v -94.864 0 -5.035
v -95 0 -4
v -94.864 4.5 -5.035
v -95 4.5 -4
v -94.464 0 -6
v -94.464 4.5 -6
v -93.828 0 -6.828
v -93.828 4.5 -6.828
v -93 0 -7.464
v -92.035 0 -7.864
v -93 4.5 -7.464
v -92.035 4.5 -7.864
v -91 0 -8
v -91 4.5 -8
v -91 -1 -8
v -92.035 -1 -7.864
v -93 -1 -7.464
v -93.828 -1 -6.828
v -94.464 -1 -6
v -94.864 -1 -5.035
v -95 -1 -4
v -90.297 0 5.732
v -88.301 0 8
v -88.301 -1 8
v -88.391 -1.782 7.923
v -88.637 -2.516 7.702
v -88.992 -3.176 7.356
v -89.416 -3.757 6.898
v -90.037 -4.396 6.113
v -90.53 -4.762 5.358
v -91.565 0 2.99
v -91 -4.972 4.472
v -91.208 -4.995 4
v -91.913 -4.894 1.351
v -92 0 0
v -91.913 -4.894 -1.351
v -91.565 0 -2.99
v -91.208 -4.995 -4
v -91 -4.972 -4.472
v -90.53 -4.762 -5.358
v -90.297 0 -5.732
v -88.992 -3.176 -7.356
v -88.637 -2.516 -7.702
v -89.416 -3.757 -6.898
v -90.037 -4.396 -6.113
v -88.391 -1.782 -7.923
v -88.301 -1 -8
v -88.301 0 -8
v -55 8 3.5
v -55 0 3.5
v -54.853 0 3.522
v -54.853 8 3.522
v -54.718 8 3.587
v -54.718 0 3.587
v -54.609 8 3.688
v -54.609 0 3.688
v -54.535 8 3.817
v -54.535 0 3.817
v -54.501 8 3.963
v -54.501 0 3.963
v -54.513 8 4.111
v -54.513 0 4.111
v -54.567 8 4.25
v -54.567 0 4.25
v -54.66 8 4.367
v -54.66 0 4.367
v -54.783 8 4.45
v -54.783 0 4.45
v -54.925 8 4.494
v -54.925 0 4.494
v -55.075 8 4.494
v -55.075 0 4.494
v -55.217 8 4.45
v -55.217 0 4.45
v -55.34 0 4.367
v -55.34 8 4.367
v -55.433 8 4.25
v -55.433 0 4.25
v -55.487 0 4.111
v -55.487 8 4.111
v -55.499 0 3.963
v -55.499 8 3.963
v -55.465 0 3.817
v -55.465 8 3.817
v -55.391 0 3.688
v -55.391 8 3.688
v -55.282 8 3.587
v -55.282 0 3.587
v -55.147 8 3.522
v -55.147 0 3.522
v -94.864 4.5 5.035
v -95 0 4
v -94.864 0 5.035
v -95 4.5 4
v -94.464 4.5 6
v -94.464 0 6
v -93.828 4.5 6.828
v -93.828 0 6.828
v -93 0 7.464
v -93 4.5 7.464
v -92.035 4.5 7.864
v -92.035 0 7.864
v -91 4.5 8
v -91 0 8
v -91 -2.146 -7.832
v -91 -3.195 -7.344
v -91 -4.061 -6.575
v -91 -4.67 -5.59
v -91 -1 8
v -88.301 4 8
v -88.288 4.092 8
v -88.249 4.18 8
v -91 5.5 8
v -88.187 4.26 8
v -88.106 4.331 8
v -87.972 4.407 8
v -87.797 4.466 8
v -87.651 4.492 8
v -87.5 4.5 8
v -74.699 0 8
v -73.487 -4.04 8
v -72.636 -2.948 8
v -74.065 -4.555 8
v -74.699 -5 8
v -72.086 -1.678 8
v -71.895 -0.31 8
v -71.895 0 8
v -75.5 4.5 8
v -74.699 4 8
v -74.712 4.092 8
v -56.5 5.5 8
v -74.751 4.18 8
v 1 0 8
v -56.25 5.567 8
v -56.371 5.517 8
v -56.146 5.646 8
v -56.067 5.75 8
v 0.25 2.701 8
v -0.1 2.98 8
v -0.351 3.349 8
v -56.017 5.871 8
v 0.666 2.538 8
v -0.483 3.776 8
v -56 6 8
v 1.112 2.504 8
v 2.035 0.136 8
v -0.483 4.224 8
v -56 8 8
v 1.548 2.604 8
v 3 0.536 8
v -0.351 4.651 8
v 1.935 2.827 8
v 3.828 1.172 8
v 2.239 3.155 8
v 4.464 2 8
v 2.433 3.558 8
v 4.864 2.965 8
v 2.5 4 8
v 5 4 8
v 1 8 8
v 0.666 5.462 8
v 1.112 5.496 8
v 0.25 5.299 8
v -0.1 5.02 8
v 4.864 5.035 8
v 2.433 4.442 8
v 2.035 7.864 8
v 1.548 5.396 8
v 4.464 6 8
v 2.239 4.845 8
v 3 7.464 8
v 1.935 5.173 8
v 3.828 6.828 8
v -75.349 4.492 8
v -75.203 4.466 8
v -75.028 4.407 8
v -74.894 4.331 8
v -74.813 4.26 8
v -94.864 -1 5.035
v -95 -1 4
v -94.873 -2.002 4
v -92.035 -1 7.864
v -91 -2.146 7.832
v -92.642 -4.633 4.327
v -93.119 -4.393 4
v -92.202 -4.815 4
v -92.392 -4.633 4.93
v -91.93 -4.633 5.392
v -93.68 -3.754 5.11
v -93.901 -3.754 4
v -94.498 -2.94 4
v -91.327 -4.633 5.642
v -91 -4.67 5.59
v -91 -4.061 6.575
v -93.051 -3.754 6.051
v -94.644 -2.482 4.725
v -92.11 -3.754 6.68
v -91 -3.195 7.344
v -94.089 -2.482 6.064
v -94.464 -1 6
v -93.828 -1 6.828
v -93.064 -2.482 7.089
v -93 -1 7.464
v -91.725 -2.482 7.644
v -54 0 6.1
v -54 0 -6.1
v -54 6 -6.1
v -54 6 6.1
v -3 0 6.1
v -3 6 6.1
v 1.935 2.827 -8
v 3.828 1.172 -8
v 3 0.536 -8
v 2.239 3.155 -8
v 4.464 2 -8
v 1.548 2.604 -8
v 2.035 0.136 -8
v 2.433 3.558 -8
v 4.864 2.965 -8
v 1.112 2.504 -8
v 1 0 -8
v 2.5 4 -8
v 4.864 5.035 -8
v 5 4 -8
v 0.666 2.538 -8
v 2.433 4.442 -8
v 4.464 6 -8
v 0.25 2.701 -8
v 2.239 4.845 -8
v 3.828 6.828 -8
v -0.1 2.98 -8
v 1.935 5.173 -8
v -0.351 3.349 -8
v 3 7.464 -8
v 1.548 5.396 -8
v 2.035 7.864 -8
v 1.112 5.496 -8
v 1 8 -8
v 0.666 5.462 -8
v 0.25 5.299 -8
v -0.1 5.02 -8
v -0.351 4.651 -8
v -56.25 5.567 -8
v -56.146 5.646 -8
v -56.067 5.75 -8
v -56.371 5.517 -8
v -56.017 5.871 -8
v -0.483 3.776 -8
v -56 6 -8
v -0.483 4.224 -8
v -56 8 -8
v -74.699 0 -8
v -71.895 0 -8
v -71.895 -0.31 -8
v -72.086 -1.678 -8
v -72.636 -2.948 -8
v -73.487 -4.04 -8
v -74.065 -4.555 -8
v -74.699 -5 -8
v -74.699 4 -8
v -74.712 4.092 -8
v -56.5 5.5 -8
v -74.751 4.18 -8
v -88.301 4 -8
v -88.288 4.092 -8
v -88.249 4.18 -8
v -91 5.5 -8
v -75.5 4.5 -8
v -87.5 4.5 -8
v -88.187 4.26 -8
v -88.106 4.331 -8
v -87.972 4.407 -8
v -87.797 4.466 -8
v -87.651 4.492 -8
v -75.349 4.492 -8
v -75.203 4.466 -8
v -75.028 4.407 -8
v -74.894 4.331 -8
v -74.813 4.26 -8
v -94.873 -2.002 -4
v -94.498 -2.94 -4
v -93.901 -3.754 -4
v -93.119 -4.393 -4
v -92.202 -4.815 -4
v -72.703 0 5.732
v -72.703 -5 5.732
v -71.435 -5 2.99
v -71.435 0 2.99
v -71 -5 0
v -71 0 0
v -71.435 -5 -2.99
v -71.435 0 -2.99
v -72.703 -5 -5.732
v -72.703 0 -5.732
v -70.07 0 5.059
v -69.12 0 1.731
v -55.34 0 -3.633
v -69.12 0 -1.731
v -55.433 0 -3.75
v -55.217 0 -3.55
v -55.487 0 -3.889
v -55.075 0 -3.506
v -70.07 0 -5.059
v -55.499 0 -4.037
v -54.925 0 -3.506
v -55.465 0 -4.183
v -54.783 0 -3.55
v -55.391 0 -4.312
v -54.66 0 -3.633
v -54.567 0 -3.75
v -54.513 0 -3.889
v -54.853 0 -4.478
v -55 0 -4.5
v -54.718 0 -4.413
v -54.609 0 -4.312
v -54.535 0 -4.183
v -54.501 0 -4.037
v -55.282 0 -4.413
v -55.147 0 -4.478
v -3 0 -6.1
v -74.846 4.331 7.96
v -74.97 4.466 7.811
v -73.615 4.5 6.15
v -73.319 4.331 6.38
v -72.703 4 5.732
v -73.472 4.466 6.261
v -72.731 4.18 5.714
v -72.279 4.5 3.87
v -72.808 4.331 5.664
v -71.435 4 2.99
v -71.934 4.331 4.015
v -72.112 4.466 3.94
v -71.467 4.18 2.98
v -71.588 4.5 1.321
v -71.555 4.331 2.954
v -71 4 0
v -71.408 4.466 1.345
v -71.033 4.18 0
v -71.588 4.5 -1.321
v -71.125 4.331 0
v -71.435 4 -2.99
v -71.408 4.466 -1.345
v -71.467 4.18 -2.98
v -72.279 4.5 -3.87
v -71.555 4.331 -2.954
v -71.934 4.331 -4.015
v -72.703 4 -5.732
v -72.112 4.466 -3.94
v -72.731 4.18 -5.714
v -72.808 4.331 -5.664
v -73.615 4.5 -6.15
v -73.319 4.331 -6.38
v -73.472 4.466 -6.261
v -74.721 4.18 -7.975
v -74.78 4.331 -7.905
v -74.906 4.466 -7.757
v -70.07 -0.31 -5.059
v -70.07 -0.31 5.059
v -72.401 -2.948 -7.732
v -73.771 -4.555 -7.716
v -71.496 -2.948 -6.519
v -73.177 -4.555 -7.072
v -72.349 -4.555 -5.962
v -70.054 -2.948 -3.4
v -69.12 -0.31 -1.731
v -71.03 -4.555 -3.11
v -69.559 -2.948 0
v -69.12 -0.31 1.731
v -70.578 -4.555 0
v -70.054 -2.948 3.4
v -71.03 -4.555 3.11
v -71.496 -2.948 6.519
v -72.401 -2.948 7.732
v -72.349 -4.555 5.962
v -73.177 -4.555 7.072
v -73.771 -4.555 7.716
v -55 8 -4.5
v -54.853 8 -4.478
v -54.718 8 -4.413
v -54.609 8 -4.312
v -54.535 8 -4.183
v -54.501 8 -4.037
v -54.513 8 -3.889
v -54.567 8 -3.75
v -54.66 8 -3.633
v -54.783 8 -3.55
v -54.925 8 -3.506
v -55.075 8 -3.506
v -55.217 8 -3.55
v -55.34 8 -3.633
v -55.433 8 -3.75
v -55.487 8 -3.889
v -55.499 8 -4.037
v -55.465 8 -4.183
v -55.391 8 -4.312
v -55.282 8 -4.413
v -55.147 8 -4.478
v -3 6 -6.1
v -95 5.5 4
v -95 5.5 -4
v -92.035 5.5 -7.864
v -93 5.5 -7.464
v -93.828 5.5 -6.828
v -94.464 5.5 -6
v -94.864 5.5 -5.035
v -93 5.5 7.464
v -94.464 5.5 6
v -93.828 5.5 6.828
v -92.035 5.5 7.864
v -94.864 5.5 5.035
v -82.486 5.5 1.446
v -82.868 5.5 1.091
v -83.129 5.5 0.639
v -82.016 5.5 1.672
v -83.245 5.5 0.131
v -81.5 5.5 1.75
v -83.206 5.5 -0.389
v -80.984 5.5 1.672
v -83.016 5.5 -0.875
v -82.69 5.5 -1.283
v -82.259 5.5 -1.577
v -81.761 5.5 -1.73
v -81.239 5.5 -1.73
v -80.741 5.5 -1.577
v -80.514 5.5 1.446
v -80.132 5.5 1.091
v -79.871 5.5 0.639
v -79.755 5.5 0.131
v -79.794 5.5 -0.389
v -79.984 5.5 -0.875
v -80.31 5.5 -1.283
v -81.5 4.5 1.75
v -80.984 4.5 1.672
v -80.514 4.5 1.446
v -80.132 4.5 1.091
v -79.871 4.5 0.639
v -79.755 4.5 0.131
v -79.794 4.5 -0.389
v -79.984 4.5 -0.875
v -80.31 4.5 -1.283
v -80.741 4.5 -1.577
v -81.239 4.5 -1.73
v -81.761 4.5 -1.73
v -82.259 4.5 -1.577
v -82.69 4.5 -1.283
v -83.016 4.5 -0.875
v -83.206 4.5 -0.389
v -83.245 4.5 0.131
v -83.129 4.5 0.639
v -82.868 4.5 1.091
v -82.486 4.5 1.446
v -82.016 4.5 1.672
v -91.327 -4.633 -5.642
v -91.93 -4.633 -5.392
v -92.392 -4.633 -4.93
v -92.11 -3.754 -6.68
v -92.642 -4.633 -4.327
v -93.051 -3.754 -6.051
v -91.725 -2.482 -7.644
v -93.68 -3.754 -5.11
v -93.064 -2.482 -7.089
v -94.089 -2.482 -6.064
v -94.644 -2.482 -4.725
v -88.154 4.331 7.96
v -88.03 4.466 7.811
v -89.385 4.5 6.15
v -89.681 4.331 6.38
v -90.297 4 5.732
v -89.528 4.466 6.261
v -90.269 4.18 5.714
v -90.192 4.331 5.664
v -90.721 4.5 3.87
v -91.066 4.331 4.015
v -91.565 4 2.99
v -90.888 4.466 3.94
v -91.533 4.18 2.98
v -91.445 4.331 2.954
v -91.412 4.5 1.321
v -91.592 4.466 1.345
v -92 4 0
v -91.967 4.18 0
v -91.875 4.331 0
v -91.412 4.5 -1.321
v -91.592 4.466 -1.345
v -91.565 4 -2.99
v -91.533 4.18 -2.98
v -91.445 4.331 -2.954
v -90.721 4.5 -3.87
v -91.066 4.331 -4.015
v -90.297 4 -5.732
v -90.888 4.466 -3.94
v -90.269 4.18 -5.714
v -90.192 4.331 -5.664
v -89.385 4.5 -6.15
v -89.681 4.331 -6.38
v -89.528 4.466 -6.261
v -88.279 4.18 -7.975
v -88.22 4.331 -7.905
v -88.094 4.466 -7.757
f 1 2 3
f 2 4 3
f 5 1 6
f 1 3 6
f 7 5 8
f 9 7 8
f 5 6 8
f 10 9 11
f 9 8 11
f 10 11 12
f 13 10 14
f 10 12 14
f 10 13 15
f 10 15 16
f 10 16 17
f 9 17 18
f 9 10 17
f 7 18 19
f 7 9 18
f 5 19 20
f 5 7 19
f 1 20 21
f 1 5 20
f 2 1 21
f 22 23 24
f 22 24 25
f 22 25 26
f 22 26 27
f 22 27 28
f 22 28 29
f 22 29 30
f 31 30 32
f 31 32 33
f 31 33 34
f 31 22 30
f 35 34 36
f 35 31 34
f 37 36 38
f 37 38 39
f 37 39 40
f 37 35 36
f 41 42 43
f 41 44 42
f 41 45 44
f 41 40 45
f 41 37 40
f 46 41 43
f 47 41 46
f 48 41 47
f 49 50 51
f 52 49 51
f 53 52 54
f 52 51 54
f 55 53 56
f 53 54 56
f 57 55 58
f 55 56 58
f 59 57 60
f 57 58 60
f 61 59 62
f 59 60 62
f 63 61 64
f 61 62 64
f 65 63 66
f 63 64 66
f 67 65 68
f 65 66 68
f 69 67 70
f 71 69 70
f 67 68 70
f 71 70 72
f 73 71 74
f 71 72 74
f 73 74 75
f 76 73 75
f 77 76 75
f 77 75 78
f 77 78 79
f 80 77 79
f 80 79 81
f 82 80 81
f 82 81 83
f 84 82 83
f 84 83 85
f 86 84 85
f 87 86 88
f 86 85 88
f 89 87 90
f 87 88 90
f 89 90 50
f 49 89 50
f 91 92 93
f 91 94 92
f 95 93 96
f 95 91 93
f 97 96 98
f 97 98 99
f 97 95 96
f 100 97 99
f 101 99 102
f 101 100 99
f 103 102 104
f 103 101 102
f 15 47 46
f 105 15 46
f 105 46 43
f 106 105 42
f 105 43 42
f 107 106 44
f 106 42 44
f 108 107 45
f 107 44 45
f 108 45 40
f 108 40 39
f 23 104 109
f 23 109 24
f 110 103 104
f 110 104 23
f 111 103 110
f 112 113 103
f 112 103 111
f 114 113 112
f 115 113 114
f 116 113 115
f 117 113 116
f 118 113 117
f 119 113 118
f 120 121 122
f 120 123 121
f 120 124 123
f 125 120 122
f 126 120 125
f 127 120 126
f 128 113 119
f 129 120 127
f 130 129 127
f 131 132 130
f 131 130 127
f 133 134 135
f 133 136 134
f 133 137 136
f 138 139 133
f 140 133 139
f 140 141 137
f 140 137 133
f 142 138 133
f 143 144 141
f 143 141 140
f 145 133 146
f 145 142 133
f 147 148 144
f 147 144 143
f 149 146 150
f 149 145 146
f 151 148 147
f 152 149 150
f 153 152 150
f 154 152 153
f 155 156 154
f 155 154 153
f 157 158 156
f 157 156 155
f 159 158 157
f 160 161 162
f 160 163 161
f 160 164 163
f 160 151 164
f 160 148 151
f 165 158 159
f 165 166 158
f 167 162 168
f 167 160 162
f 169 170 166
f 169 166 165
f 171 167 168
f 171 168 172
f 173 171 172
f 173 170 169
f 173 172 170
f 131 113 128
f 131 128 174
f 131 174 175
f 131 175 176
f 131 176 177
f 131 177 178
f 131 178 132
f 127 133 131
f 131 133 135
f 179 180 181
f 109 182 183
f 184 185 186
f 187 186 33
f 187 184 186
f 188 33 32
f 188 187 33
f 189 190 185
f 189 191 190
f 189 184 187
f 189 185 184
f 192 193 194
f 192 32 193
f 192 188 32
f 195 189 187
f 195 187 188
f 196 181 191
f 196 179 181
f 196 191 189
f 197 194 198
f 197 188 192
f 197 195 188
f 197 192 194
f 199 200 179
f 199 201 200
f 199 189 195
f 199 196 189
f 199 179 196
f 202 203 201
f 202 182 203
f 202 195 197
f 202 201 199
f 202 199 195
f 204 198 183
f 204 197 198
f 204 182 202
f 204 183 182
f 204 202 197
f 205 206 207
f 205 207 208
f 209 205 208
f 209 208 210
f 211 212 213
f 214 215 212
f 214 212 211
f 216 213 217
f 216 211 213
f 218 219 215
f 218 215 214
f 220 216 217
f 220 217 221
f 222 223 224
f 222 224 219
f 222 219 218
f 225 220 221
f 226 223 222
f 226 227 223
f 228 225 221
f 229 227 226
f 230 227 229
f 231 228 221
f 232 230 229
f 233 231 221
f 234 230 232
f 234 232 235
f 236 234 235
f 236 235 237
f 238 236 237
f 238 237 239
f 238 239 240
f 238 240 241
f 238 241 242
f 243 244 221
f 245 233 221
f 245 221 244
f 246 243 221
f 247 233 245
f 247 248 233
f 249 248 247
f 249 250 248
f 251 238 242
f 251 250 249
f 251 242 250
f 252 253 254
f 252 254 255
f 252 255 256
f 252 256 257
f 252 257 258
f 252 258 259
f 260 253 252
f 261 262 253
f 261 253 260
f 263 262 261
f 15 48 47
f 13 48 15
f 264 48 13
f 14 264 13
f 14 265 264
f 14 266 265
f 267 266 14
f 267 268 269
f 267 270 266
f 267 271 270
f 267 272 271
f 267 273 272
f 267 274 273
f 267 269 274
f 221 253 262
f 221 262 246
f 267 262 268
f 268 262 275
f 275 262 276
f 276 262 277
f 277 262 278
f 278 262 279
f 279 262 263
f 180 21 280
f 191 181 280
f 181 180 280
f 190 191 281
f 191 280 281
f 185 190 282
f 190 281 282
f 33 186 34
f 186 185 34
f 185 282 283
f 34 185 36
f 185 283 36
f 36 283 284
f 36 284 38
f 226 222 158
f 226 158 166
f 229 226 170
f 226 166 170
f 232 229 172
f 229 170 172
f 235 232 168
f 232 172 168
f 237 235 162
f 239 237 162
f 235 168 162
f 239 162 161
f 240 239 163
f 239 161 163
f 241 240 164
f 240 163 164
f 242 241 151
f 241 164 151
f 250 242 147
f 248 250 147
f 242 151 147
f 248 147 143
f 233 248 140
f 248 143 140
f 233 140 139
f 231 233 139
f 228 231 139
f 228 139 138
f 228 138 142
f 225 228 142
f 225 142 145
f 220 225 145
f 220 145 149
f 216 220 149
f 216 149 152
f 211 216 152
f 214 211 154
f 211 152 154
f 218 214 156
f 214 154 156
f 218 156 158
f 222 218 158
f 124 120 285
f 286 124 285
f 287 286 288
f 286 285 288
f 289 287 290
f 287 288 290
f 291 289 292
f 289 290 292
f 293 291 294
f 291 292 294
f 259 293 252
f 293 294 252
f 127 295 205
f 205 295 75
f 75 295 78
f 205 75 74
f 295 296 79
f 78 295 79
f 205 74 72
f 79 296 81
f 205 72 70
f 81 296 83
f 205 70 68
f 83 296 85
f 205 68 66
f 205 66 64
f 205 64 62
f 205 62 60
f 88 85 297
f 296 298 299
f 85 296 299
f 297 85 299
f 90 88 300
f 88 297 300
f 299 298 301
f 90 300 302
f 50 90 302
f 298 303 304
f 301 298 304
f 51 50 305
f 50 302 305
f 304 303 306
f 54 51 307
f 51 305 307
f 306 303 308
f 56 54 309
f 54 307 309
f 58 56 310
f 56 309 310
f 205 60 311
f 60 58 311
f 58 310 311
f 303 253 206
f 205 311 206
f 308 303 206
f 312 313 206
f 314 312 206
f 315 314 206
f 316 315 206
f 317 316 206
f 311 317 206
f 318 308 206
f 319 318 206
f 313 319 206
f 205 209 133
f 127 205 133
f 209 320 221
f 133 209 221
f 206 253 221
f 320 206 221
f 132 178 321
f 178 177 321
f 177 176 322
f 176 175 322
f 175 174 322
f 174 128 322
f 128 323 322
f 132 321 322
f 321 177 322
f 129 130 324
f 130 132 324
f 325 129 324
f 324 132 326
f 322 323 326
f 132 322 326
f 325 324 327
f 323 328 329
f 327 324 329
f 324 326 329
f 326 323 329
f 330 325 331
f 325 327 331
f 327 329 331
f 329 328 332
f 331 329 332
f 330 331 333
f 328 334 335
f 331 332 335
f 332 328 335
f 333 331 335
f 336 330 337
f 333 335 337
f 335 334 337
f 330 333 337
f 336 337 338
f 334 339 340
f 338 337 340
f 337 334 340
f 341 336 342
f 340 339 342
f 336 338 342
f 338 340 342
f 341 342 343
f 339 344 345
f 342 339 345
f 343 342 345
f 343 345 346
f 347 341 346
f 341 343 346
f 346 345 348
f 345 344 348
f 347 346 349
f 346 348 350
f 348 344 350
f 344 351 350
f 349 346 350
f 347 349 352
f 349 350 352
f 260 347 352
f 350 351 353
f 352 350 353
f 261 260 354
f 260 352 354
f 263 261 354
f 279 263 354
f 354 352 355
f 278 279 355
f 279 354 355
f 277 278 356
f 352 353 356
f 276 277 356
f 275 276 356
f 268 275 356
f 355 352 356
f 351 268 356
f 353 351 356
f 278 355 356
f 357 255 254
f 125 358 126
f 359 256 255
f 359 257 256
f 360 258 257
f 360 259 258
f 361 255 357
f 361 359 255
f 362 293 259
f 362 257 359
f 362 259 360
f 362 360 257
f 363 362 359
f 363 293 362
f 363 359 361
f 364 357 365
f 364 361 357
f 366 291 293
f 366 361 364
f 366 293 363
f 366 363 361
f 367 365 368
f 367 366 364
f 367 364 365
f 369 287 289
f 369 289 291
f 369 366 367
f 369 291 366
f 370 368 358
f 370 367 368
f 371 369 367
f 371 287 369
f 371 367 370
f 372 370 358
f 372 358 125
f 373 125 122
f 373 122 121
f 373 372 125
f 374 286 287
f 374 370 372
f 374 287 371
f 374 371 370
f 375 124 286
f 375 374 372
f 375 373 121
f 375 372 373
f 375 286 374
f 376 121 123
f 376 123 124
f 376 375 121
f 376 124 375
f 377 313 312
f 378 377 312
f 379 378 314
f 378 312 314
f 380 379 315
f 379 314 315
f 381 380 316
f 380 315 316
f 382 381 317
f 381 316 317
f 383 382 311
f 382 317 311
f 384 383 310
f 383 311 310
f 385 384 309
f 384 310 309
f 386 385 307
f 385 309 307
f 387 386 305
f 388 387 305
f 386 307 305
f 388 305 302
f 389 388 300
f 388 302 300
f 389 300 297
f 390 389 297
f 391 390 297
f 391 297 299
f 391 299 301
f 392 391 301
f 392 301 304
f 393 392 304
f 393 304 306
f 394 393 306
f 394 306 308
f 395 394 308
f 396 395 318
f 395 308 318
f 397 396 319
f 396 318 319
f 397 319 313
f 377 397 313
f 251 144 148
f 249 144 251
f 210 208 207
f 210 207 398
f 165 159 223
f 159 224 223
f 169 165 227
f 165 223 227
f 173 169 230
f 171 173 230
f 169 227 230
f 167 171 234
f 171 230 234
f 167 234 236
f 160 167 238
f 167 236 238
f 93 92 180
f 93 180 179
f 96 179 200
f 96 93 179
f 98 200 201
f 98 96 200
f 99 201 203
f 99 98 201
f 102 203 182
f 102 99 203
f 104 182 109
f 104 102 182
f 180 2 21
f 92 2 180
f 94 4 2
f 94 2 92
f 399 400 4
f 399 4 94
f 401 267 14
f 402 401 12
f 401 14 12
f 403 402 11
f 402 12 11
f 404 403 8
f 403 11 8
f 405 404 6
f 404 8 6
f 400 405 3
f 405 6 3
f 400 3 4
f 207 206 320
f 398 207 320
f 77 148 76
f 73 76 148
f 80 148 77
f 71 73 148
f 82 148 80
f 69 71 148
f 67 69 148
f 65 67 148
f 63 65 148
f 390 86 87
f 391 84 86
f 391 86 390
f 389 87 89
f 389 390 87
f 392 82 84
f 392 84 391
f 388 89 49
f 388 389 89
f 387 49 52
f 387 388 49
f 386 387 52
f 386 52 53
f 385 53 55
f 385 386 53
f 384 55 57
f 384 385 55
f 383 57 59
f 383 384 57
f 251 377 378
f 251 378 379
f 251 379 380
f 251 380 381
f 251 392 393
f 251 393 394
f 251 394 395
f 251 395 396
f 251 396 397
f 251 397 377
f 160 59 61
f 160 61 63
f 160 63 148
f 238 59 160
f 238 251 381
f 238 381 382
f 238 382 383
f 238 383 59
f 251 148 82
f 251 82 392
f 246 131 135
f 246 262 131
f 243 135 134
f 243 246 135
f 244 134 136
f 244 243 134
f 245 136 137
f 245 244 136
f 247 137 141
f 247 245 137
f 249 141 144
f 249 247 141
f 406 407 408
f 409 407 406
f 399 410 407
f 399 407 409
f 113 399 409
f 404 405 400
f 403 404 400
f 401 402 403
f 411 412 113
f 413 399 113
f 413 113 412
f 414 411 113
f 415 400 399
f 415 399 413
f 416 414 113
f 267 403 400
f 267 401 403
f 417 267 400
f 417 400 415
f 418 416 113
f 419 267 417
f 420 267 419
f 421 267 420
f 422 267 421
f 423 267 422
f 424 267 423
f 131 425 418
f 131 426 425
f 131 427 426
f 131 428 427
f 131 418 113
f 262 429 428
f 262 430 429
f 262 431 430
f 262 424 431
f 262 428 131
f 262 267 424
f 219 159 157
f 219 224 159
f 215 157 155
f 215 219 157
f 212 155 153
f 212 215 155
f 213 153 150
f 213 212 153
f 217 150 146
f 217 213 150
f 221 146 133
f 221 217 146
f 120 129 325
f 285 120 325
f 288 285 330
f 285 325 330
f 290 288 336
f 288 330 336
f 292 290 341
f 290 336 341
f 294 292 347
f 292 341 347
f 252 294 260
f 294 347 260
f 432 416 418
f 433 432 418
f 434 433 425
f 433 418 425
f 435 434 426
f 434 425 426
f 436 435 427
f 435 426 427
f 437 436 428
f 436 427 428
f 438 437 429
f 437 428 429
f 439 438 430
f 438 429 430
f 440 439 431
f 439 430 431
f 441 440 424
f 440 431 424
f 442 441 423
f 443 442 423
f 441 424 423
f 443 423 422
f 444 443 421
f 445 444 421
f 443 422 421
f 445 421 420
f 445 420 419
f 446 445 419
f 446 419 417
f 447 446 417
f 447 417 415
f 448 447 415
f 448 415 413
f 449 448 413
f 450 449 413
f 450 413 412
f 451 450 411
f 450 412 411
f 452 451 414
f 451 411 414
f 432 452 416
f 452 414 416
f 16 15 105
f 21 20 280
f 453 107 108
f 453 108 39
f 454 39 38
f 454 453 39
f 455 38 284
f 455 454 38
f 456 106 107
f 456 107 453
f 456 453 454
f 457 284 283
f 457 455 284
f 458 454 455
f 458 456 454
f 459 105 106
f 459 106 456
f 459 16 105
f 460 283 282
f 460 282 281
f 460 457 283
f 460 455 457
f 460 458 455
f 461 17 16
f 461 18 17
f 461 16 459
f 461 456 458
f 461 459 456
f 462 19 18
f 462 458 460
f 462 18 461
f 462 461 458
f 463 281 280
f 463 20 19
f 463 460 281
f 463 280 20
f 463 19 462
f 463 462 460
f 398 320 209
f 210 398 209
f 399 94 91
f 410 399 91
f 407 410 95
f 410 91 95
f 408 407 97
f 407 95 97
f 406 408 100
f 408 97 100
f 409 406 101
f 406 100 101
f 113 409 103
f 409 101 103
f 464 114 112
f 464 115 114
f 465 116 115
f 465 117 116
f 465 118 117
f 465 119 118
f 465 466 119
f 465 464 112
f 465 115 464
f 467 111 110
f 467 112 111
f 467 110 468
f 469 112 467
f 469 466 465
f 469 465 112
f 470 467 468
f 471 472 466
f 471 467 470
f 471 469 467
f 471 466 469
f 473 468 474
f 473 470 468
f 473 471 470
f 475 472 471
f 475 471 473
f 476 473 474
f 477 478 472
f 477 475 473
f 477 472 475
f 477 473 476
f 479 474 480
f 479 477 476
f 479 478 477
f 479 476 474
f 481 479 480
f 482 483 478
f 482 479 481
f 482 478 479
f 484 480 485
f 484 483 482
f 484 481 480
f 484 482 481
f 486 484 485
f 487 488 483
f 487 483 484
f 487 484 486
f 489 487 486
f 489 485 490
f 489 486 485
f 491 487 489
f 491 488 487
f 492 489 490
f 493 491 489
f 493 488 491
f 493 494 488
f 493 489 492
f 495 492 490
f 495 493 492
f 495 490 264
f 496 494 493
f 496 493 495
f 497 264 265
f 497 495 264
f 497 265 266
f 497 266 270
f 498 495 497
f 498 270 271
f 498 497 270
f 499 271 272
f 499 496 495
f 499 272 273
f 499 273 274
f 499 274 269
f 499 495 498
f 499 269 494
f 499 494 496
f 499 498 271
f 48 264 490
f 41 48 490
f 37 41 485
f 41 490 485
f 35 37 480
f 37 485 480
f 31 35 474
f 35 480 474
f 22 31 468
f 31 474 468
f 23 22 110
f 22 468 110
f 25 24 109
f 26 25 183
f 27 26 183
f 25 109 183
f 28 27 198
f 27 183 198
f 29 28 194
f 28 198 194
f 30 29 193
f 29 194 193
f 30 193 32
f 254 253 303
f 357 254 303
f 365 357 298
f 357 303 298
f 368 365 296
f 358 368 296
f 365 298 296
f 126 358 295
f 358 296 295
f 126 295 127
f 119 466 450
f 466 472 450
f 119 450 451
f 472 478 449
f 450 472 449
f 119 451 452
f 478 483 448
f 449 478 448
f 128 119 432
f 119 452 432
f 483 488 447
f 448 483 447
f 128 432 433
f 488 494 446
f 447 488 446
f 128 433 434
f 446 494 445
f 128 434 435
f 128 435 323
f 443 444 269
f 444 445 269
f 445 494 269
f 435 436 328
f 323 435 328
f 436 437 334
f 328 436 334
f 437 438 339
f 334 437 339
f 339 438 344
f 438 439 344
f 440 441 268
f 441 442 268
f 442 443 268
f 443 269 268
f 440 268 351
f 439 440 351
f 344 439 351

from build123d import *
from build123d.topology import SkipClean

# Parameters (mm, degrees)
SKETCH1_W           = 10
SKETCH1_H           = 16
BOSS_EXTRUDE1_DEPTH = 8
FILLET1_R           = 4
SKETCH2_R           = 1.5
CUT_EXTRUDE1_DEPTH  = 16
SKETCH3_W           = 51
SKETCH3_H           = 16
BOSS_EXTRUDE2_DEPTH = 8
SKETCH4_W           = 36
SKETCH4_H           = 16
BOSS_EXTRUDE3_DEPTH = 4.5
SKETCH6_R           = 10.5
CUT_EXTRUDE6_DEPTH  = 16
SKETCH11_W          = 3
SKETCH11_H          = 16
BOSS_EXTRUDE4_DEPTH = 4.5
FILLET3_R           = 4
BOSS_EXTRUDE5_DEPTH = 1
SKETCH14_R          = 1.75
CUT_EXTRUDE7_DEPTH  = 1
BOSS_EXTRUDE6_DEPTH = 5
FILLET4_R           = 6.5
FILLET5_R           = 0.5
FILLET6_R           = 4
FILLET7_R           = 0.5
SKETCH17_W          = 51
SKETCH17_H          = 12.2
CUT_EXTRUDE9_DEPTH  = 6
SKETCH18_R          = 0.5
CUT_EXTRUDE10_DEPTH = 8


# Some blends are built 0.0001 mm under size
with BuildPart() as part:
    # Sketch1 → Boss-Extrude1 (new body)
    with BuildSketch(Plane(origin=(0, 0, 0), x_dir=(1, 0, 0), z_dir=(0, 1, 0))):
        Rectangle(SKETCH1_W, SKETCH1_H)
    extrude(amount=BOSS_EXTRUDE1_DEPTH)

    # Fillet1
    fillet1_edges = [part.edges().sort_by_distance(p)[0] for p in [
        (5, 0, 0),
        (5, 8, 0),
    ]]
    fillet(fillet1_edges, radius=FILLET1_R - 0.0001)  # a hair under: the kernel refuses the full size

    # Sketch2 → Cut-Extrude1 (cut)
    with BuildSketch(Plane.XY.offset(8)):
        with Locations((1, 4)):
            Circle(SKETCH2_R)
    extrude(amount=-CUT_EXTRUDE1_DEPTH, mode=Mode.SUBTRACT)

    # Sketch3 → Boss-Extrude2 (add)
    with BuildSketch(Plane(origin=(0, 0, 0), x_dir=(1, 0, 0), z_dir=(0, 1, 0))):
        with Locations((-30.5, 0)):
            Rectangle(SKETCH3_W, SKETCH3_H)
    extrude(amount=BOSS_EXTRUDE2_DEPTH)

    # Sketch4 → Boss-Extrude3 (add)
    with BuildSketch(Plane(origin=(0, 0, 0), x_dir=(1, 0, 0), z_dir=(0, 1, 0))):
        with Locations((-74, 0)):
            Rectangle(SKETCH4_W, SKETCH4_H)
    extrude(amount=BOSS_EXTRUDE3_DEPTH)

    # Sketch6 → Cut-Extrude6 (cut)
    with BuildSketch(Plane(origin=(0, 4.5, 0), x_dir=(1, 0, 0), z_dir=(0, 1, 0))):
        with Locations((-81.5, 0)):
            Circle(SKETCH6_R)
    extrude(amount=-CUT_EXTRUDE6_DEPTH, mode=Mode.SUBTRACT)


with BuildPart() as cut_extrude6_piece_1:
    # of the separate pieces the step leaves, piece 1, a body of its own (cut_extrude6_pieces)
    add(part.part.solids().sort_by_distance((5, 3.9999, -8))[0])



with BuildPart() as cut_extrude6_piece_2:
    # of the separate pieces the step leaves, piece 2, a body of its own (cut_extrude6_pieces)
    add(part.part.solids().sort_by_distance((-88.300735254, 4.5, 8))[0])



with BuildPart() as cut_extrude6_piece_3:
    # of the separate pieces the step leaves, piece 3, a body of its own (cut_extrude6_pieces)
    add(part.part.solids().sort_by_distance((-88.300735254, 0, -8))[0])


with BuildPart() as cut_extrude6_piece_2_1:
    add(cut_extrude6_piece_2.part)

    add(cut_extrude6_piece_3.part)  # Boss-Extrude4 merges Cut-Extrude6 piece 3
    # Sketch11 → Boss-Extrude4 (add)
    with BuildSketch(Plane(origin=(0, 0, 0), x_dir=(1, 0, 0), z_dir=(0, 1, 0))):
        with Locations((-93.5, 0)):
            Rectangle(SKETCH11_W, SKETCH11_H)
    extrude(amount=BOSS_EXTRUDE4_DEPTH)

    # Fillet3
    fillet3_edges = [cut_extrude6_piece_2_1.edges().sort_by_distance(p)[0] for p in [
        (-95, 2.25, 8),
        (-95, 2.25, -8),
    ]]
    fillet(fillet3_edges, radius=FILLET3_R)


with BuildPart() as cut_extrude6_piece_1_1:
    add(cut_extrude6_piece_1.part)

    add(cut_extrude6_piece_2_1.part)  # Boss-Extrude5 merges Cut-Extrude6 piece 2
    # Sketch13 → Boss-Extrude5 (add)
    with BuildSketch(Plane(origin=(0, 4.5, 0), x_dir=(1, 0, 0), z_dir=(0, 1, 0))):
        with BuildLine():
            Line((-88.300735254, 8), (-91, 8))
            ThreePointArc((-91, 8), (-93.828427125, 6.828427125), (-95, 4))
            Line((-95, 4), (-95, -4))
            ThreePointArc((-95, -4), (-93.828427125, -6.828427125), (-91, -8))
            Line((-91, -8), (-88.300735254, -8))
            Line((-88.300735254, -8), (-74.699264746, -8))
            Line((-74.699264746, -8), (-56, -8))
            Line((-56, -8), (-56, 8))
            Line((-56, 8), (-74.699264746, 8))
            Line((-74.699264746, 8), (-88.300735254, 8))
        make_face()
    extrude(amount=BOSS_EXTRUDE5_DEPTH)

    # Sketch14 → Cut-Extrude7 (cut)
    with BuildSketch(Plane(origin=(0, 5.5, 0), x_dir=(1, 0, 0), z_dir=(0, 1, 0))):
        with Locations(Location((-81.5, 0, 0), (0, 0, 270))):
            Circle(SKETCH14_R)
    extrude(amount=-CUT_EXTRUDE7_DEPTH, mode=Mode.SUBTRACT)

    # Sketch15 → Boss-Extrude6 (add)
    with SkipClean():  # the faces are left unmerged after this step: merging them gives an invalid solid
        with BuildSketch(Plane.XZ):
            with BuildLine():
                Line((-91, 8), (-88.300735254, 8))
                ThreePointArc((-88.300735254, 8), (-92, 0), (-88.300735254, -8))
                Line((-88.300735254, -8), (-91, -8))
                ThreePointArc((-91, -8), (-93.828427125, -6.828427125), (-95, -4))
                Line((-95, -4), (-95, 4))
                ThreePointArc((-95, 4), (-93.828427125, 6.828427125), (-91, 8))
            make_face()
            with BuildLine():
                Line((-71.895313644, 8), (-74.699264746, 8))
                ThreePointArc((-74.699264746, 8), (-71, 0), (-74.699264746, -8))
                Line((-74.699264746, -8), (-71.895313644, -8))
                ThreePointArc((-71.895313644, -8), (-69, 0), (-71.895313644, 8))
            make_face()
        extrude(amount=BOSS_EXTRUDE6_DEPTH)

    # Fillet4
    # the kernel refuses this fillet: 6.5 mm, written as the material it takes off along each edge
    with BuildSketch(Plane(origin=(-81.5, -5, 0), x_dir=(-0.06203986114443866, 0, -0.998073672445666), z_dir=(-0.998073672445666, 0, 0.06203986114443866))) as fillet4_piece_1:
        with BuildLine():
            CenterArc((6, -4.69041576), FILLET4_R, 0, 46.18693854)
            Line((10.5, 0), (12.5, 0))
            Line((12.5, 0), (12.5, -4.69041576))
        make_face()
    revolve(axis=Axis((-81.5, -5, 0), (0, -1, 0)), revolution_arc=187.113812842, mode=Mode.SUBTRACT)

    # Fillet5
    fillet5_edges = [cut_extrude6_piece_1_1.edges().sort_by_distance(p)[0] for p in [
        (-71, 4.5, 0),
        (-92, 4.5, 0),
    ]]
    fillet(fillet5_edges, radius=FILLET5_R)

    # Fillet6
    # the kernel refuses this fillet: 4 mm, written as the material it takes off along each edge
    with BuildSketch(Plane(origin=(-91, -5, 8), x_dir=(0, 0, -1), z_dir=(1, 0, 0))) as fillet6_piece_1:
        with BuildLine():
            CenterArc((FILLET6_R, FILLET6_R), FILLET6_R, 180, 90)
            Line((0, FILLET6_R), (0, 0))
            Line((0, 0), (FILLET6_R, 0))
        make_face()
    extrude(amount=12.699264746, mode=Mode.SUBTRACT)
    with BuildSketch(Plane(origin=(-91, -5, 4), x_dir=(-1, 0, 0), z_dir=(0, 0, -1))) as fillet6_piece_2:
        with BuildLine():
            CenterArc((4 - FILLET6_R, FILLET6_R), FILLET6_R, 270, 90)
            Line((4, FILLET6_R), (4, 0))
            Line((4, 0), (4 - FILLET6_R, 0))
        make_face()
    revolve(axis=Axis((-91, -5, 4), (0, 1, 0)), revolution_arc=90, mode=Mode.SUBTRACT)
    with BuildSketch(Plane(origin=(-78.300735254, -5, -8), x_dir=(0, 1, 0), z_dir=(-1, 0, 0))) as fillet6_piece_3:
        with BuildLine():
            CenterArc((FILLET6_R, -FILLET6_R), FILLET6_R, 90, 90)
            Line((0, -FILLET6_R), (0, 0))
            Line((0, 0), (FILLET6_R, 0))
        make_face()
    extrude(amount=12.699264746, mode=Mode.SUBTRACT)
    with BuildSketch(Plane(origin=(-91, -5, -4), x_dir=(0, 0, -1), z_dir=(1, 0, 0))) as fillet6_piece_4:
        with BuildLine():
            CenterArc((4 - FILLET6_R, FILLET6_R), FILLET6_R, 270, 90)
            Line((4, FILLET6_R), (4, 0))
            Line((4, 0), (4 - FILLET6_R, 0))
        make_face()
    revolve(axis=Axis((-91, -5, -4), (0, 1, 0)), revolution_arc=90, mode=Mode.SUBTRACT)
    with BuildSketch(Plane(origin=(-95, -5, -4), x_dir=(1, 0, 0), z_dir=(0, 0, 1))) as fillet6_piece_5:
        with BuildLine():
            CenterArc((FILLET6_R, FILLET6_R), FILLET6_R, 180, 90)
            Line((0, FILLET6_R), (0, 0))
            Line((0, 0), (FILLET6_R, 0))
        make_face()
    extrude(amount=8, mode=Mode.SUBTRACT)

    # Fillet7
    fillet7_edges = [cut_extrude6_piece_1_1.edges().sort_by_distance(p)[0] for p in [
        (-56, 5.5, 0),
    ]]
    fillet(fillet7_edges, radius=FILLET7_R)

    # Sketch17 → Cut-Extrude9 (cut)
    with BuildSketch(Plane.XZ):
        with Locations((-28.5, 0)):
            Rectangle(SKETCH17_W, SKETCH17_H)
    extrude(amount=-CUT_EXTRUDE9_DEPTH, mode=Mode.SUBTRACT)

    # Sketch18 → Cut-Extrude10 (cut)
    with BuildSketch(Plane.XZ):
        with Locations(Location((-55, 4, 0), (0, 0, 270))):
            Circle(SKETCH18_R)
        with Locations(Location((-55, -4, 0), (0, 0, 270))):
            Circle(SKETCH18_R)
    extrude(amount=-CUT_EXTRUDE10_DEPTH, mode=Mode.SUBTRACT)


solid = cut_extrude6_piece_1_1.part
